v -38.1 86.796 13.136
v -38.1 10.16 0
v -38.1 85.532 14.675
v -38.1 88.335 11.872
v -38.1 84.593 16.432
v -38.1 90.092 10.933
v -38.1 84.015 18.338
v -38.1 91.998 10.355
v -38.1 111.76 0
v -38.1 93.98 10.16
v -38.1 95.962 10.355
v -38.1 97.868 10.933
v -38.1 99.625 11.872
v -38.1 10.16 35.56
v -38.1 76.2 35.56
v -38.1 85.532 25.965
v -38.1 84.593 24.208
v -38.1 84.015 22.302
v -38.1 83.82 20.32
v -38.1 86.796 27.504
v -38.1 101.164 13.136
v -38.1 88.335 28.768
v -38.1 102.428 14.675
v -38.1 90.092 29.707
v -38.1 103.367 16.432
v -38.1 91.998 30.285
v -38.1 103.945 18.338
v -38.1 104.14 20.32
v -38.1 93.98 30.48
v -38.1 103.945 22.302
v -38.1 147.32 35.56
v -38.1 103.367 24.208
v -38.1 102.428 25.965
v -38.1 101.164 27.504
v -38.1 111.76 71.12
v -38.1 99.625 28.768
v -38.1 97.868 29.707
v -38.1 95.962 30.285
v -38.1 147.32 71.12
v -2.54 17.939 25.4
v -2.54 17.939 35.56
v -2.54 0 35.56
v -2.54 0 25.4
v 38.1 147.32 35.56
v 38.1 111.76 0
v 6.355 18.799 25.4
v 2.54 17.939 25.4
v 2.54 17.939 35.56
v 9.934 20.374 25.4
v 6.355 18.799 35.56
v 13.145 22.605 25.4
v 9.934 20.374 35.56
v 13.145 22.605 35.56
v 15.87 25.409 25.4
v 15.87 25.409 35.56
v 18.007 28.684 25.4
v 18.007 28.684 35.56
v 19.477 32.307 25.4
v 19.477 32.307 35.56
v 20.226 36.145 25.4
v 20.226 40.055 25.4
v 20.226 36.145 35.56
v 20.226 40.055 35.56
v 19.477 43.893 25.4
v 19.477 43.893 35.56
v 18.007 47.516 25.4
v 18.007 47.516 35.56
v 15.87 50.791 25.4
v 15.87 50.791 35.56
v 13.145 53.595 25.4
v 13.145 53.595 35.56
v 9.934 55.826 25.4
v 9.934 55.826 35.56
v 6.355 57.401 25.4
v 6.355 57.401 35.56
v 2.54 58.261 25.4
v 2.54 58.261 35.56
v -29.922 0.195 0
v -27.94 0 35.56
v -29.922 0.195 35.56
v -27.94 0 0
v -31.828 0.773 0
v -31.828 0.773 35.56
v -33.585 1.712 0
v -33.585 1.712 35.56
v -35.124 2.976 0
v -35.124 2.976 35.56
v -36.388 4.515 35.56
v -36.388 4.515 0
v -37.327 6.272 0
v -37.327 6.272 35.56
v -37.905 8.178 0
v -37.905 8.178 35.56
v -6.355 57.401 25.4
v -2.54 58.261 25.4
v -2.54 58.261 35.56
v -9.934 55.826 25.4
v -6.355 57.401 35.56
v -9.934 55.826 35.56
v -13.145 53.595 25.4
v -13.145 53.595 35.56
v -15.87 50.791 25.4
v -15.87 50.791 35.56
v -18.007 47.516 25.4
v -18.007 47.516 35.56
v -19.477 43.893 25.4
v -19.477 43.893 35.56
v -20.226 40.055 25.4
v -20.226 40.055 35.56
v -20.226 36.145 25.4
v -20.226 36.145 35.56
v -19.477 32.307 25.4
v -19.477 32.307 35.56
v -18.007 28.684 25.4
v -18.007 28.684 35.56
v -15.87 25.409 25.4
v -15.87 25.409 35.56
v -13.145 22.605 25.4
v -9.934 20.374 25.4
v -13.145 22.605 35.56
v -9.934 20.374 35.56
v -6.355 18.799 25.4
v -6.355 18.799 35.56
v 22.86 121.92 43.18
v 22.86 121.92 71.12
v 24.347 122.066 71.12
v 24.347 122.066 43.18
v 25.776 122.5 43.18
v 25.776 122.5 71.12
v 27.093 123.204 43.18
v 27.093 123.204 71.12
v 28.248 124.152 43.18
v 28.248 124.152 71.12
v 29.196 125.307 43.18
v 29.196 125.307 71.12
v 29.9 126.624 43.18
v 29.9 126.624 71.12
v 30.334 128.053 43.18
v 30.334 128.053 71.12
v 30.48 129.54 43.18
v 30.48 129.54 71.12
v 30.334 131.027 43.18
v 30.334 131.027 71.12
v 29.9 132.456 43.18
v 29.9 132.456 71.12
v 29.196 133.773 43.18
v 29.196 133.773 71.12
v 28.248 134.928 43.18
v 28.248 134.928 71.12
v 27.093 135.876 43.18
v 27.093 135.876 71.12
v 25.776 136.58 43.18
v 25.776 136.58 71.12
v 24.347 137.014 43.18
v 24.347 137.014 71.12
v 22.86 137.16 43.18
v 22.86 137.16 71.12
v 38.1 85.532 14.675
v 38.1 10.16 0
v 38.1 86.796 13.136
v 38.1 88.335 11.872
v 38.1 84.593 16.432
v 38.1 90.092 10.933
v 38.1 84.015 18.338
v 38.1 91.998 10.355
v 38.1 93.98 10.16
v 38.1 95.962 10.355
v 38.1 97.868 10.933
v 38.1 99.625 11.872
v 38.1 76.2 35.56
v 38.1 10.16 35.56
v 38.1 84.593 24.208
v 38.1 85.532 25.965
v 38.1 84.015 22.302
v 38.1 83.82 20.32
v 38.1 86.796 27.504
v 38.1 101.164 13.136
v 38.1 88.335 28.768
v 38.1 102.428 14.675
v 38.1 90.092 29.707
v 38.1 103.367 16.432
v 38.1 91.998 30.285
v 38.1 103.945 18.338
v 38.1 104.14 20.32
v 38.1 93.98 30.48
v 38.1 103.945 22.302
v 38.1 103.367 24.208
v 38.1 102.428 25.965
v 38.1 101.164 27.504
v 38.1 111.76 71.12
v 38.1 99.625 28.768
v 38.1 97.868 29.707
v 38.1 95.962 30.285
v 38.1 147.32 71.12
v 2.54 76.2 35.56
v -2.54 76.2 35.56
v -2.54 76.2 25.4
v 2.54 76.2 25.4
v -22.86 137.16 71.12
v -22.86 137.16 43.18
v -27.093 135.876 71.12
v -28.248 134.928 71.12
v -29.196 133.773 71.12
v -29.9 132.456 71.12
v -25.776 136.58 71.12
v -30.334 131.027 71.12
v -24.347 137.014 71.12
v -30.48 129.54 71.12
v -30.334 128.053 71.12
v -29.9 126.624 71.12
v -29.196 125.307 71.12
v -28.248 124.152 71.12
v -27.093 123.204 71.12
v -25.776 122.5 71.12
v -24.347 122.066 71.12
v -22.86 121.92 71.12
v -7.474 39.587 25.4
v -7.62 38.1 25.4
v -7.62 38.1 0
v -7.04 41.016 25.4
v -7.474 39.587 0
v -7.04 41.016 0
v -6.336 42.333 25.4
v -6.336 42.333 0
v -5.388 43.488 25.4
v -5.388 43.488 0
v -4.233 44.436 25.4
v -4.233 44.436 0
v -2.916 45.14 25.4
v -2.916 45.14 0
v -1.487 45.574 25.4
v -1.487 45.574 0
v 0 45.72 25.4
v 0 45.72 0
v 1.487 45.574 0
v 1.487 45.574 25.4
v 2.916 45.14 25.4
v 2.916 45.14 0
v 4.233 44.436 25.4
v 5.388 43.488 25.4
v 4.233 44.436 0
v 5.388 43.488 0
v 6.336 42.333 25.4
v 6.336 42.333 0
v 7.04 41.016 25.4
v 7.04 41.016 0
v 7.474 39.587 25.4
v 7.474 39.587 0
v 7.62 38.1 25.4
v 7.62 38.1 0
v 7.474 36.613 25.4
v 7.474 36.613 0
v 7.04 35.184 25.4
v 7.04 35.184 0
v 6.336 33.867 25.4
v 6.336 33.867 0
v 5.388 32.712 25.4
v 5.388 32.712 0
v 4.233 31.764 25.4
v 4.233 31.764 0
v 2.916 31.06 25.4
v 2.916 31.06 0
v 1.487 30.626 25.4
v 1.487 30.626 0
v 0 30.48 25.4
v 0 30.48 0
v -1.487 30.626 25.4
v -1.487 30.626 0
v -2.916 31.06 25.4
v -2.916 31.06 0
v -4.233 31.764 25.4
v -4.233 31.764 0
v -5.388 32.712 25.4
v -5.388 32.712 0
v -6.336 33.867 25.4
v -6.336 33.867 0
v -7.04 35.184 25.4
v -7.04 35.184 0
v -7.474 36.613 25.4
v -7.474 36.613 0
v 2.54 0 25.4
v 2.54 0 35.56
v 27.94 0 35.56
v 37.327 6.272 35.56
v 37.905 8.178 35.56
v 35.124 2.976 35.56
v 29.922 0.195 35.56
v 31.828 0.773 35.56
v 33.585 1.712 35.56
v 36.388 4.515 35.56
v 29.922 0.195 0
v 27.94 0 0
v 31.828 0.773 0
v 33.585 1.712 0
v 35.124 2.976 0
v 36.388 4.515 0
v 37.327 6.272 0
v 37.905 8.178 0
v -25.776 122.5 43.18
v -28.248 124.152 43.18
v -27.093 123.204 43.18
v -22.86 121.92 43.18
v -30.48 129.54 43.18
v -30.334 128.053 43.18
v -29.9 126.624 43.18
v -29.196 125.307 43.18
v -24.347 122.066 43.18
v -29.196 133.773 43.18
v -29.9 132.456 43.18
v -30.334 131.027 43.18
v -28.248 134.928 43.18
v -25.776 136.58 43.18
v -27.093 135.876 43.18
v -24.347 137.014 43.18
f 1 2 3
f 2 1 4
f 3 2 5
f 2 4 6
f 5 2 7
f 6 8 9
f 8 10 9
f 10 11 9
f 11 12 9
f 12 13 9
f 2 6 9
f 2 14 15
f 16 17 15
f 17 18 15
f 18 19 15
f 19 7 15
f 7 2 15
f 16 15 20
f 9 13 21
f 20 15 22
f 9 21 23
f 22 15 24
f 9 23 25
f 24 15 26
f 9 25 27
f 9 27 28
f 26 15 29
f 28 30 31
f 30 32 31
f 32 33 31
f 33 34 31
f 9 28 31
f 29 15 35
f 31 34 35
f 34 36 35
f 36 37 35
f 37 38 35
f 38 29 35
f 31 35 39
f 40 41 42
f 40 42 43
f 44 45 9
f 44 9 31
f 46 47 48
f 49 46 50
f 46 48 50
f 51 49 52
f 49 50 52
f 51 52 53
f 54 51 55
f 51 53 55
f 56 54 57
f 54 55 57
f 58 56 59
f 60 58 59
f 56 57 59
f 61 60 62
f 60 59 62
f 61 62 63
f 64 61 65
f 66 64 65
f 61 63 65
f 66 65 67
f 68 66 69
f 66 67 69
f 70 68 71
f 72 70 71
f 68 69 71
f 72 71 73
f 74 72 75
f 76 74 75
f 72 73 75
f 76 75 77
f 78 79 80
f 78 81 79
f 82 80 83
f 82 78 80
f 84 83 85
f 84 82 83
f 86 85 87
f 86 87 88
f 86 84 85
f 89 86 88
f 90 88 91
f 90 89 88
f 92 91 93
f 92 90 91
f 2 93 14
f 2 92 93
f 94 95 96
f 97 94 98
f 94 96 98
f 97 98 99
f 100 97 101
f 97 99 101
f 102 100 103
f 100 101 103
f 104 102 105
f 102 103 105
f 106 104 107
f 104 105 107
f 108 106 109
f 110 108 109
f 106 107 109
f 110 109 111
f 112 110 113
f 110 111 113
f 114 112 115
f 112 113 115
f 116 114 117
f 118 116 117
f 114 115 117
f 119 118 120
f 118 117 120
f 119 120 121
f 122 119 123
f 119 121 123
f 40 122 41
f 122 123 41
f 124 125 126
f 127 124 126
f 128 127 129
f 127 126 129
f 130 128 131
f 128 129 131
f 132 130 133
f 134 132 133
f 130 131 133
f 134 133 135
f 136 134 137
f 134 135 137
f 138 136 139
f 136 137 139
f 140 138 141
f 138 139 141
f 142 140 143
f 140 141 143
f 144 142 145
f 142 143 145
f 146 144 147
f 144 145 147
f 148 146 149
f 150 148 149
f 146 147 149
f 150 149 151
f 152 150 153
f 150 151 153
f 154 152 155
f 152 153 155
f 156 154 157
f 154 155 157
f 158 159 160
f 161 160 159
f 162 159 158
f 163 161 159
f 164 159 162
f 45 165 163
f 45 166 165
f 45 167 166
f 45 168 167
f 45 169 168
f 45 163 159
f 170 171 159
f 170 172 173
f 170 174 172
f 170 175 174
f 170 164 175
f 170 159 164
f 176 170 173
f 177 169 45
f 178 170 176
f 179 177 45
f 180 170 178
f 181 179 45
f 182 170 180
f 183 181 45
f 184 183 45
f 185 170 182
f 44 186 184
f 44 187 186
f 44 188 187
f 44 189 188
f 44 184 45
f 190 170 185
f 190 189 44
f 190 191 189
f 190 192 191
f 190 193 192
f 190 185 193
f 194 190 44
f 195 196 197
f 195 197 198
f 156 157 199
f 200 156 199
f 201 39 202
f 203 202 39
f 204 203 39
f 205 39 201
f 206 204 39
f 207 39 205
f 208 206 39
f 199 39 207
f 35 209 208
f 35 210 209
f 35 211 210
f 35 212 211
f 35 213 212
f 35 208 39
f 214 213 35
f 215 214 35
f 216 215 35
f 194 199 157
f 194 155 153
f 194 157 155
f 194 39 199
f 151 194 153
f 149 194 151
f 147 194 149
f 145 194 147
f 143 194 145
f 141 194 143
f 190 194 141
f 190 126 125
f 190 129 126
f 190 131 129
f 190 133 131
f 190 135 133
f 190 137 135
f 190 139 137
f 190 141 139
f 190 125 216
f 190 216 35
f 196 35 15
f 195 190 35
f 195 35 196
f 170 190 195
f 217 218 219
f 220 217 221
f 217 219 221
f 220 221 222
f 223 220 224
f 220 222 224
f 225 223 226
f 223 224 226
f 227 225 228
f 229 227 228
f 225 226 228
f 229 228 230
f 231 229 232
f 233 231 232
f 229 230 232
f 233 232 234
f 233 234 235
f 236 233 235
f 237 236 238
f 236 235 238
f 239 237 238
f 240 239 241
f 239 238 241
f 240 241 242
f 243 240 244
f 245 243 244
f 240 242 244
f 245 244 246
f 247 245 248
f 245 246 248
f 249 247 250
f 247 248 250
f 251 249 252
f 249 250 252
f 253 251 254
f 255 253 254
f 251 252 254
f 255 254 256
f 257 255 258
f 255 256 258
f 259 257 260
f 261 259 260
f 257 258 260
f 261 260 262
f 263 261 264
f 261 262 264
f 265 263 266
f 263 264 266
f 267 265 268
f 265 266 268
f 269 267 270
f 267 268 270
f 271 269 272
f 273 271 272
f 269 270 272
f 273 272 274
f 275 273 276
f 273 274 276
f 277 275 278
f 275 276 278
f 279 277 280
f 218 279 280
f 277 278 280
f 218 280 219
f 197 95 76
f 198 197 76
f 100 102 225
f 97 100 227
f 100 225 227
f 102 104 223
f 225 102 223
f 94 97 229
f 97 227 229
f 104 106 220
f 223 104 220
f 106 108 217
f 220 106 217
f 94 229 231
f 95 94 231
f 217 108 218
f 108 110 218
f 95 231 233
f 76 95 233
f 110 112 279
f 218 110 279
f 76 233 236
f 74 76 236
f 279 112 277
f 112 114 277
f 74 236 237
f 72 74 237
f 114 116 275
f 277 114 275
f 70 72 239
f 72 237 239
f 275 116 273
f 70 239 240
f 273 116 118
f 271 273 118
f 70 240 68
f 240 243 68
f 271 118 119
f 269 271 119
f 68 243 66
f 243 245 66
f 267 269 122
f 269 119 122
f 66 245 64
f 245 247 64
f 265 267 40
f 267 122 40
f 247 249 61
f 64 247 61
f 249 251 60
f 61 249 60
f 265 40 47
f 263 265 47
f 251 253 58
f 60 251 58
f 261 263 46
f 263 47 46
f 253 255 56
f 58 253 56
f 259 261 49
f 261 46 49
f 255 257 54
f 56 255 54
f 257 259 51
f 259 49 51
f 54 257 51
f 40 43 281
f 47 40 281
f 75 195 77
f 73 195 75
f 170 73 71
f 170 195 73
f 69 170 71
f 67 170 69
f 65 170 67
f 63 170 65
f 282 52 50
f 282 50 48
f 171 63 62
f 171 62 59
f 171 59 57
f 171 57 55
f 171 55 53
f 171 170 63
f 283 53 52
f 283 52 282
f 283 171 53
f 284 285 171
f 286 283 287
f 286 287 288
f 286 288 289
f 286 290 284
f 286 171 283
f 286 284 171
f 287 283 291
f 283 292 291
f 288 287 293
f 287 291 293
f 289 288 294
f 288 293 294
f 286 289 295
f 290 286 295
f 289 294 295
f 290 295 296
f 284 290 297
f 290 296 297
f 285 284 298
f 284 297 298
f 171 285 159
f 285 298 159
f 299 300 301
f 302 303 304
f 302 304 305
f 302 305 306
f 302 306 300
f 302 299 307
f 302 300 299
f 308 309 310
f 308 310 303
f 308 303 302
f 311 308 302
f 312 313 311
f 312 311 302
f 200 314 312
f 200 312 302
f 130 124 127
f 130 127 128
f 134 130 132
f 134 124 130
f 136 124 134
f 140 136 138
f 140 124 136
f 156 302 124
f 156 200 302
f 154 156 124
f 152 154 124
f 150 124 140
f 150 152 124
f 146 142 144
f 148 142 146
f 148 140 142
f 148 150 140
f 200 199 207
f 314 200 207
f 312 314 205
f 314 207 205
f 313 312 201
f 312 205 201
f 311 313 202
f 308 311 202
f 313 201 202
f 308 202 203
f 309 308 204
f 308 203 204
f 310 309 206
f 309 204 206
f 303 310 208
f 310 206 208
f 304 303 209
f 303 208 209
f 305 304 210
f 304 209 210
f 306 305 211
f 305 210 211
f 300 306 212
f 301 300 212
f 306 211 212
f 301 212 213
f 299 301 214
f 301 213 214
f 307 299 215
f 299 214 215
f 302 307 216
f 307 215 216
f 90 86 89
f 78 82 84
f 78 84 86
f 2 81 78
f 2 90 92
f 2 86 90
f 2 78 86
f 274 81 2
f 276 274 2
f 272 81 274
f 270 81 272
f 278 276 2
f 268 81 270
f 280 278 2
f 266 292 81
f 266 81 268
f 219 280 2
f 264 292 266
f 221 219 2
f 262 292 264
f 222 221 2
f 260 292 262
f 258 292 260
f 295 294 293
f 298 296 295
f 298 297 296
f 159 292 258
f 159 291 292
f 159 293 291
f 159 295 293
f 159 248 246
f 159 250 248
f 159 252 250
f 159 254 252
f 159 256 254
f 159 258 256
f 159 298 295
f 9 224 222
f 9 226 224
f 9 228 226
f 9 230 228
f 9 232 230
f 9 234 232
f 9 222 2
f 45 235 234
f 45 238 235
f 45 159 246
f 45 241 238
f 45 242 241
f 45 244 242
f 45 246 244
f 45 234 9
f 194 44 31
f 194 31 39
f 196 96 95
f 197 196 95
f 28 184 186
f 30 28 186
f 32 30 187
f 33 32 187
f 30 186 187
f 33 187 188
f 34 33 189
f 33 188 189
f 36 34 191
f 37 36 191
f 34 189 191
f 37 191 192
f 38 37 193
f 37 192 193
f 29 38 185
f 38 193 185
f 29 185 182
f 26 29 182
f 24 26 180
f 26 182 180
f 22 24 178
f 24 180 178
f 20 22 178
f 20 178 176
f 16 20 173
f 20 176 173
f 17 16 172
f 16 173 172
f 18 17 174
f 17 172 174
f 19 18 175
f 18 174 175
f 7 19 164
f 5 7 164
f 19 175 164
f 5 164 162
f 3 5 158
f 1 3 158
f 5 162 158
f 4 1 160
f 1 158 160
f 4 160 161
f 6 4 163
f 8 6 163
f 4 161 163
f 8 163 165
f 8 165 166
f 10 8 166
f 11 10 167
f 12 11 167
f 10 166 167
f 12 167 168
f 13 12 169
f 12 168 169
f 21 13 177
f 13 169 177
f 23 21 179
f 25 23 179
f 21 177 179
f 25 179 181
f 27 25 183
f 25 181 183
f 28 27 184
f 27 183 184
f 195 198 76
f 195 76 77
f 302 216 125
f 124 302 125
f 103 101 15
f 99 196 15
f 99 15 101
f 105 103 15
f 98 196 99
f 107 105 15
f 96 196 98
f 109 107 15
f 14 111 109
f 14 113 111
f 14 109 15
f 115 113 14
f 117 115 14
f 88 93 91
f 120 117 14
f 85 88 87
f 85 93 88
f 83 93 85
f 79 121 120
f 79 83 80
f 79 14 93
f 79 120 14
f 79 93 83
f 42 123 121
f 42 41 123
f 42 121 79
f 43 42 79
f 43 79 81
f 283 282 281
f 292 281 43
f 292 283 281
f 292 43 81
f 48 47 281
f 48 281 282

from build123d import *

# Parameters (mm, degrees)
F1_DEPTH       = 38.1
F3_D           = 15.24
F3_CBORE_D     = 40.64
F3_CBORE_DEPTH = 10.16
F5_DEPTH       = 76.2
F6_R           = 10.16
F7_DEPTH       = 76.2
F9_DEPTH       = 27.94
F10_R          = 10.16


with BuildPart() as f1:
    # F0 (on Right) → F1 (new body, symmetric)
    with BuildSketch(Plane.YZ):
        Polygon((0, 35.56), (0, 0), (111.76, 0), (147.32, 35.56), (147.32, 71.12), (111.76, 71.12), (76.2, 35.56), align=None)
    extrude(amount=F1_DEPTH, both=True)

    # F3 (through all)
    with Locations(Plane.XY.offset(35.56)):
        with Locations((0, 38.1)):
            CounterBoreHole(F3_D / 2, F3_CBORE_D / 2, F3_CBORE_DEPTH)

    # F4 (on face) → F5 (cut)
    with BuildSketch(Plane.XZ):
        Polygon((2.54, 35.56), (0, 35.56), (-2.54, 35.56), (-2.54, 25.4), (2.54, 25.4), align=None)
    extrude(amount=-F5_DEPTH, mode=Mode.SUBTRACT)

    # F6 (on face) → F7 (cut)
    with BuildSketch(Plane.YZ.offset(38.1)):
        with Locations((93.98, 20.32)):
            Circle(F6_R)
    extrude(amount=-F7_DEPTH, mode=Mode.SUBTRACT)

    # F8 (on face) → F9 (cut)
    with BuildSketch(Plane.XY.offset(71.12)):
        with BuildLine():
            Line((22.86, 137.16), (-22.86, 137.16))
            ThreePointArc((-22.86, 137.16), (-30.48, 129.54), (-22.86, 121.92))
            Line((-22.86, 121.92), (22.86, 121.92))
            ThreePointArc((22.86, 121.92), (30.48, 129.54), (22.86, 137.16))
        make_face()
    extrude(amount=-F9_DEPTH, mode=Mode.SUBTRACT)

    # F10
    f10_edges = [f1.edges().sort_by_distance(p)[0] for p in [
        (38.1, 0, 17.78),
        (-38.1, 0, 17.78),
    ]]
    fillet(f10_edges, radius=F10_R)


solid = f1.part
